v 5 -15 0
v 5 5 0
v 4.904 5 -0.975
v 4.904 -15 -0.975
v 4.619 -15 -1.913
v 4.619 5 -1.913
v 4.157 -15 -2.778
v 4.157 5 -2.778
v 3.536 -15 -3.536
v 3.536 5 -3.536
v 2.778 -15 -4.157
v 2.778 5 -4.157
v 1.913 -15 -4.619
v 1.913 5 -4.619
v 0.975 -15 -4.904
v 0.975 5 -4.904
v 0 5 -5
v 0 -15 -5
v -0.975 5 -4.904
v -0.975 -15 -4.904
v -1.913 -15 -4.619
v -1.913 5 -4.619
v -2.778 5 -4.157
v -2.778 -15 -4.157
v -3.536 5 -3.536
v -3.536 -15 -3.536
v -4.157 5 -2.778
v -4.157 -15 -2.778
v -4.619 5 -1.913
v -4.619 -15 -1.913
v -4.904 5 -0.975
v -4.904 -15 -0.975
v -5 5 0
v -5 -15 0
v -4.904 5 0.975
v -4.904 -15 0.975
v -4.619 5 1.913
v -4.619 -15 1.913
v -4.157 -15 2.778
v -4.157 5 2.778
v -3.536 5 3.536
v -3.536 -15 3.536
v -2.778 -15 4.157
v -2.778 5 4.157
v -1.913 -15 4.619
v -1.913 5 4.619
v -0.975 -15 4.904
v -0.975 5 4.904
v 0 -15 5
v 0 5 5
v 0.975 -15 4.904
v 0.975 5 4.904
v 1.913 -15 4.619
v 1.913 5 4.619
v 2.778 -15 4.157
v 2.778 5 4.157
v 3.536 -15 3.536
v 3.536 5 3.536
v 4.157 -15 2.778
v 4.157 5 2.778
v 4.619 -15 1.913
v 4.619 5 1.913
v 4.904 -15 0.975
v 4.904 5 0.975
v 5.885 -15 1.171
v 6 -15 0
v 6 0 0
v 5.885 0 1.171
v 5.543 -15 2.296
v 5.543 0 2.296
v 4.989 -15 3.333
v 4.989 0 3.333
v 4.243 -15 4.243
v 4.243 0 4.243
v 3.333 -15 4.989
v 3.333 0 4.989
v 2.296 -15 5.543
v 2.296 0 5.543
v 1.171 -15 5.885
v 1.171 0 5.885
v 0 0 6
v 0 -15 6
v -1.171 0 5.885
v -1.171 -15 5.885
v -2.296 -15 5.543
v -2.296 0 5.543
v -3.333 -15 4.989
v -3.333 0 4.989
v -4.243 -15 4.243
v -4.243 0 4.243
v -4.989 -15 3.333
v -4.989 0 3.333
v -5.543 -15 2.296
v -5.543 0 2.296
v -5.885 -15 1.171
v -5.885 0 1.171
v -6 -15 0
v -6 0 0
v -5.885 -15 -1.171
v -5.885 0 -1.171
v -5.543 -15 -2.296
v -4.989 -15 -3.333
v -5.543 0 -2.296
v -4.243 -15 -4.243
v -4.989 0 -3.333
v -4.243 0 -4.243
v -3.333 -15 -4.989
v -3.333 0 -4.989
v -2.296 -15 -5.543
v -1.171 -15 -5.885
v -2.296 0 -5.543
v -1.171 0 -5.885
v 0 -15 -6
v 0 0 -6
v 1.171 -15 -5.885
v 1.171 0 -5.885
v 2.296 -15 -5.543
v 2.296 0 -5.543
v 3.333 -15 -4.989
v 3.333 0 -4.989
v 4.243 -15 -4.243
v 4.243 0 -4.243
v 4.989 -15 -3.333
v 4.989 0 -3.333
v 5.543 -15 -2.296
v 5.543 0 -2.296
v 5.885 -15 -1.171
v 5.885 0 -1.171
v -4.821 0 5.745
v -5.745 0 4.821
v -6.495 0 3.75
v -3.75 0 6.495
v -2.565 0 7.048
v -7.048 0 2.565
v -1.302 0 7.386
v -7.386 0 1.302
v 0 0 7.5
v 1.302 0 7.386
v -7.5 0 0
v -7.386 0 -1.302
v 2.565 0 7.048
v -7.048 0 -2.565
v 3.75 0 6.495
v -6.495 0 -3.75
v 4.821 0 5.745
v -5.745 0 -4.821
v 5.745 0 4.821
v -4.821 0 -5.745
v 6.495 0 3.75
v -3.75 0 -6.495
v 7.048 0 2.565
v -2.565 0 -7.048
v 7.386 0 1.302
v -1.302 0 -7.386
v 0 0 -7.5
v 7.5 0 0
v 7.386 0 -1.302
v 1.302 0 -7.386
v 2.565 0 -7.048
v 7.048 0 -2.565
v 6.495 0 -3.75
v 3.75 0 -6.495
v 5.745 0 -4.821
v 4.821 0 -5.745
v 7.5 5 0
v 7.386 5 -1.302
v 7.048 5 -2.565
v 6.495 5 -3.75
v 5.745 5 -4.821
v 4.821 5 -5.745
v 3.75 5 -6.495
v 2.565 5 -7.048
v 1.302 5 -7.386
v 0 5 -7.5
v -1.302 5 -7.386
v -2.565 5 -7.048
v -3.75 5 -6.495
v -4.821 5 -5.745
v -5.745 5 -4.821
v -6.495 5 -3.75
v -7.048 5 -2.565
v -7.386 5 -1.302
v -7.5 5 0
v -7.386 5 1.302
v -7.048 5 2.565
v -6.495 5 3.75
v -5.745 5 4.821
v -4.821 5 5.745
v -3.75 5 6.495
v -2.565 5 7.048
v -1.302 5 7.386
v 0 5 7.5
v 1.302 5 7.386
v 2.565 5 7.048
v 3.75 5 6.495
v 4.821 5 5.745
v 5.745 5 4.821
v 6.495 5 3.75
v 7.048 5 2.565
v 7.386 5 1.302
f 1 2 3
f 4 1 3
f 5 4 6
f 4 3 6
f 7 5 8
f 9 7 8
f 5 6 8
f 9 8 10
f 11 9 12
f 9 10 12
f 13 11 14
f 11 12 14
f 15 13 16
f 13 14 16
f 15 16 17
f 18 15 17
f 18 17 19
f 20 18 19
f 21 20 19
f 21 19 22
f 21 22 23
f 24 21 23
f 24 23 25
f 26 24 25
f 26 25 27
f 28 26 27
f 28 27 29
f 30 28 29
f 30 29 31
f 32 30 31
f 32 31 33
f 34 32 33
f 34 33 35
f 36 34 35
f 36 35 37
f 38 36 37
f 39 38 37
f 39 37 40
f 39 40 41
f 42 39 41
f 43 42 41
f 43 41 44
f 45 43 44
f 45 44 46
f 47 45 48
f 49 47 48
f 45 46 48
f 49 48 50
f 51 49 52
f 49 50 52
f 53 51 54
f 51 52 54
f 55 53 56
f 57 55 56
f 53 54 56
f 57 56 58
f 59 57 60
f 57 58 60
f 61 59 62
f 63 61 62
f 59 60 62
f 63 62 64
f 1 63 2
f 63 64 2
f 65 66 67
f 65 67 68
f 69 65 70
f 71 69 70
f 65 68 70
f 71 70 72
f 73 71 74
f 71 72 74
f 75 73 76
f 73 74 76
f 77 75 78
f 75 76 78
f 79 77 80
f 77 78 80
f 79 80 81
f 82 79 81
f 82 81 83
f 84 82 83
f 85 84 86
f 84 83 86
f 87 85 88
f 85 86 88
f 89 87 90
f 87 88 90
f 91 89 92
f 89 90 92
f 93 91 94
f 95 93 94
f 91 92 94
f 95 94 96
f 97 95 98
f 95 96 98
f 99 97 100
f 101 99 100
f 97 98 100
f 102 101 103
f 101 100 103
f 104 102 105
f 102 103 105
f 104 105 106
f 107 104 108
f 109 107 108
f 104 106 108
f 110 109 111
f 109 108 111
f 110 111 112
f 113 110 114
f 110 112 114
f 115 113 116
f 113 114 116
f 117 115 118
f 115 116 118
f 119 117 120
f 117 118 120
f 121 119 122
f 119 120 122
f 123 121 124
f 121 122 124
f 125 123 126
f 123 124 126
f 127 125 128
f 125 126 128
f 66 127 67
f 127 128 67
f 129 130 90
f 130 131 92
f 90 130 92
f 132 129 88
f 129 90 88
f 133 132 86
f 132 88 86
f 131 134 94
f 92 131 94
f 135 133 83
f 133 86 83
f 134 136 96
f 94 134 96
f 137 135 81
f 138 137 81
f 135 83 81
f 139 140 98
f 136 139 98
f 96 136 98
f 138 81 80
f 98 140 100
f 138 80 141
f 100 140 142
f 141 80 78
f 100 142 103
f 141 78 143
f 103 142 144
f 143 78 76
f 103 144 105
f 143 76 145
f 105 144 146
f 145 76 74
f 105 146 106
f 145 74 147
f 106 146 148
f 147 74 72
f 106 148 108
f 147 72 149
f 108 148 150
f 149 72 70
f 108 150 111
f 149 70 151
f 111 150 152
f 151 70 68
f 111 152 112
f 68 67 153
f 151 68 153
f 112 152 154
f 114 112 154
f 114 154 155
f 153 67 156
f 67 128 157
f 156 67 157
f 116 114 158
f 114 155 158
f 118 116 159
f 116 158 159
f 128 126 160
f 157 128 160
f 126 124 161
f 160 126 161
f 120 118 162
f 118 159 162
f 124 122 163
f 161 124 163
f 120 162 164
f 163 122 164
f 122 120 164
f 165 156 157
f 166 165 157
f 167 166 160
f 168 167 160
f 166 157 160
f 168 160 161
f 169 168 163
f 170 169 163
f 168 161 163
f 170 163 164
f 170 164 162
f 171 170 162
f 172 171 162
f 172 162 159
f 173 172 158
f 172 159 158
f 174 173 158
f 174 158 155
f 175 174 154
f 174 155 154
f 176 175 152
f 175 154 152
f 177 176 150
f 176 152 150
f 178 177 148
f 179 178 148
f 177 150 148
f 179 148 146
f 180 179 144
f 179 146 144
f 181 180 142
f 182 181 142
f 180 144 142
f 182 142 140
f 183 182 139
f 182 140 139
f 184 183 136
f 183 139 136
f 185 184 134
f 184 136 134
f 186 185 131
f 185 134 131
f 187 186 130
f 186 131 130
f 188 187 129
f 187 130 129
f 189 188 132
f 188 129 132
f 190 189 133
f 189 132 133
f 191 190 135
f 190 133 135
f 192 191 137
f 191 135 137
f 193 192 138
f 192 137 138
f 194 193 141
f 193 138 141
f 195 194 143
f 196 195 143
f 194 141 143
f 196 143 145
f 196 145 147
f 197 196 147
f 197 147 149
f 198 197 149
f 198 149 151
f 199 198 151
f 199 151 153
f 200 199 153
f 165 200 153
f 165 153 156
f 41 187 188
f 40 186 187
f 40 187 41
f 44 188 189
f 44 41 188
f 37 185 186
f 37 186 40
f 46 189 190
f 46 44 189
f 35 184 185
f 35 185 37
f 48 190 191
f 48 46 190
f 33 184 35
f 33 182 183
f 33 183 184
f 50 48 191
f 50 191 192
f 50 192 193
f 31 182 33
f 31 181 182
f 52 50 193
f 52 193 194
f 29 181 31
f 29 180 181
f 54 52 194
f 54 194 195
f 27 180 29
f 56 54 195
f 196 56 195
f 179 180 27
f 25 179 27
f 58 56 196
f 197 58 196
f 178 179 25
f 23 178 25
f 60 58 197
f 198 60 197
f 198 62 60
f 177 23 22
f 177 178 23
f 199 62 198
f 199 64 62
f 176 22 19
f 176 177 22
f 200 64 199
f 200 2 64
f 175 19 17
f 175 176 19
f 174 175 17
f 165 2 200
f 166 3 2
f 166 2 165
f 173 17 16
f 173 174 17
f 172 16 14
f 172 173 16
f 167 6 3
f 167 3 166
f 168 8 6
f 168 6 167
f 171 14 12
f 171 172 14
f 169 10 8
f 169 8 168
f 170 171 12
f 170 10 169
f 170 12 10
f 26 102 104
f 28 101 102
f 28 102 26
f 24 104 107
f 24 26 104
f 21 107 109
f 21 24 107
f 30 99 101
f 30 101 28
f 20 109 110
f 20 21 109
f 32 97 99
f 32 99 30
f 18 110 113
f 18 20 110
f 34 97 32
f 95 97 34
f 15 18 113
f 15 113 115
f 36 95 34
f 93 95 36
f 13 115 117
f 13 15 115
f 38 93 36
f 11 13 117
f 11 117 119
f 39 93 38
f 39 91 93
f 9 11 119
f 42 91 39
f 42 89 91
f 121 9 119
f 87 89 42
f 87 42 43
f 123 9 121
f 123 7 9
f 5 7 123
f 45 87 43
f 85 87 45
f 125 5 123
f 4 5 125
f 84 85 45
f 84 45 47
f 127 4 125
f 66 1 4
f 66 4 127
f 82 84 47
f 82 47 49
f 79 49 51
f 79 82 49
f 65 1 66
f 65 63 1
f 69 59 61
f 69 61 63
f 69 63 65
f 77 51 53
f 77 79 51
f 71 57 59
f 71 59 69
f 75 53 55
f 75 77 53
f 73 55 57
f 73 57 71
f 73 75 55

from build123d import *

# Parameters (mm, degrees)
ESQUISSE1_R      = 7.5
EXTRUSION1_DEPTH = 5
ESQUISSE2_R      = 6
EXTRUSION2_DEPTH = 15
EXTRUSION3_REACH = 22
ESQUISSE3_R      = 5


with BuildPart() as part:
    # Esquisse1 → Extrusion1 (new body)
    with BuildSketch(Plane(origin=(0, 0, 0), x_dir=(1, 0, 0), z_dir=(0, 1, 0))):
        Circle(ESQUISSE1_R)
    extrude(amount=EXTRUSION1_DEPTH)

    # Esquisse2 → Extrusion2 (add)
    with BuildSketch(Plane.XZ):
        Circle(ESQUISSE2_R)
    extrude(amount=EXTRUSION2_DEPTH)

    # Esquisse3 → Extrusion3 (cut, up to next)
    with BuildSketch(Plane(origin=(0, 5, 0), x_dir=(1, 0, 0), z_dir=(0, 1, 0)), mode=Mode.PRIVATE) as extrusion3_sk1:
        Circle(ESQUISSE3_R)
    extrusion3_tool1 = extrude(extrusion3_sk1.sketch, amount=-EXTRUSION3_REACH, mode=Mode.PRIVATE) & part.part
    add(extrusion3_tool1.solids().sort_by_distance((0, 5, 0))[0], mode=Mode.SUBTRACT)


solid = part.part
